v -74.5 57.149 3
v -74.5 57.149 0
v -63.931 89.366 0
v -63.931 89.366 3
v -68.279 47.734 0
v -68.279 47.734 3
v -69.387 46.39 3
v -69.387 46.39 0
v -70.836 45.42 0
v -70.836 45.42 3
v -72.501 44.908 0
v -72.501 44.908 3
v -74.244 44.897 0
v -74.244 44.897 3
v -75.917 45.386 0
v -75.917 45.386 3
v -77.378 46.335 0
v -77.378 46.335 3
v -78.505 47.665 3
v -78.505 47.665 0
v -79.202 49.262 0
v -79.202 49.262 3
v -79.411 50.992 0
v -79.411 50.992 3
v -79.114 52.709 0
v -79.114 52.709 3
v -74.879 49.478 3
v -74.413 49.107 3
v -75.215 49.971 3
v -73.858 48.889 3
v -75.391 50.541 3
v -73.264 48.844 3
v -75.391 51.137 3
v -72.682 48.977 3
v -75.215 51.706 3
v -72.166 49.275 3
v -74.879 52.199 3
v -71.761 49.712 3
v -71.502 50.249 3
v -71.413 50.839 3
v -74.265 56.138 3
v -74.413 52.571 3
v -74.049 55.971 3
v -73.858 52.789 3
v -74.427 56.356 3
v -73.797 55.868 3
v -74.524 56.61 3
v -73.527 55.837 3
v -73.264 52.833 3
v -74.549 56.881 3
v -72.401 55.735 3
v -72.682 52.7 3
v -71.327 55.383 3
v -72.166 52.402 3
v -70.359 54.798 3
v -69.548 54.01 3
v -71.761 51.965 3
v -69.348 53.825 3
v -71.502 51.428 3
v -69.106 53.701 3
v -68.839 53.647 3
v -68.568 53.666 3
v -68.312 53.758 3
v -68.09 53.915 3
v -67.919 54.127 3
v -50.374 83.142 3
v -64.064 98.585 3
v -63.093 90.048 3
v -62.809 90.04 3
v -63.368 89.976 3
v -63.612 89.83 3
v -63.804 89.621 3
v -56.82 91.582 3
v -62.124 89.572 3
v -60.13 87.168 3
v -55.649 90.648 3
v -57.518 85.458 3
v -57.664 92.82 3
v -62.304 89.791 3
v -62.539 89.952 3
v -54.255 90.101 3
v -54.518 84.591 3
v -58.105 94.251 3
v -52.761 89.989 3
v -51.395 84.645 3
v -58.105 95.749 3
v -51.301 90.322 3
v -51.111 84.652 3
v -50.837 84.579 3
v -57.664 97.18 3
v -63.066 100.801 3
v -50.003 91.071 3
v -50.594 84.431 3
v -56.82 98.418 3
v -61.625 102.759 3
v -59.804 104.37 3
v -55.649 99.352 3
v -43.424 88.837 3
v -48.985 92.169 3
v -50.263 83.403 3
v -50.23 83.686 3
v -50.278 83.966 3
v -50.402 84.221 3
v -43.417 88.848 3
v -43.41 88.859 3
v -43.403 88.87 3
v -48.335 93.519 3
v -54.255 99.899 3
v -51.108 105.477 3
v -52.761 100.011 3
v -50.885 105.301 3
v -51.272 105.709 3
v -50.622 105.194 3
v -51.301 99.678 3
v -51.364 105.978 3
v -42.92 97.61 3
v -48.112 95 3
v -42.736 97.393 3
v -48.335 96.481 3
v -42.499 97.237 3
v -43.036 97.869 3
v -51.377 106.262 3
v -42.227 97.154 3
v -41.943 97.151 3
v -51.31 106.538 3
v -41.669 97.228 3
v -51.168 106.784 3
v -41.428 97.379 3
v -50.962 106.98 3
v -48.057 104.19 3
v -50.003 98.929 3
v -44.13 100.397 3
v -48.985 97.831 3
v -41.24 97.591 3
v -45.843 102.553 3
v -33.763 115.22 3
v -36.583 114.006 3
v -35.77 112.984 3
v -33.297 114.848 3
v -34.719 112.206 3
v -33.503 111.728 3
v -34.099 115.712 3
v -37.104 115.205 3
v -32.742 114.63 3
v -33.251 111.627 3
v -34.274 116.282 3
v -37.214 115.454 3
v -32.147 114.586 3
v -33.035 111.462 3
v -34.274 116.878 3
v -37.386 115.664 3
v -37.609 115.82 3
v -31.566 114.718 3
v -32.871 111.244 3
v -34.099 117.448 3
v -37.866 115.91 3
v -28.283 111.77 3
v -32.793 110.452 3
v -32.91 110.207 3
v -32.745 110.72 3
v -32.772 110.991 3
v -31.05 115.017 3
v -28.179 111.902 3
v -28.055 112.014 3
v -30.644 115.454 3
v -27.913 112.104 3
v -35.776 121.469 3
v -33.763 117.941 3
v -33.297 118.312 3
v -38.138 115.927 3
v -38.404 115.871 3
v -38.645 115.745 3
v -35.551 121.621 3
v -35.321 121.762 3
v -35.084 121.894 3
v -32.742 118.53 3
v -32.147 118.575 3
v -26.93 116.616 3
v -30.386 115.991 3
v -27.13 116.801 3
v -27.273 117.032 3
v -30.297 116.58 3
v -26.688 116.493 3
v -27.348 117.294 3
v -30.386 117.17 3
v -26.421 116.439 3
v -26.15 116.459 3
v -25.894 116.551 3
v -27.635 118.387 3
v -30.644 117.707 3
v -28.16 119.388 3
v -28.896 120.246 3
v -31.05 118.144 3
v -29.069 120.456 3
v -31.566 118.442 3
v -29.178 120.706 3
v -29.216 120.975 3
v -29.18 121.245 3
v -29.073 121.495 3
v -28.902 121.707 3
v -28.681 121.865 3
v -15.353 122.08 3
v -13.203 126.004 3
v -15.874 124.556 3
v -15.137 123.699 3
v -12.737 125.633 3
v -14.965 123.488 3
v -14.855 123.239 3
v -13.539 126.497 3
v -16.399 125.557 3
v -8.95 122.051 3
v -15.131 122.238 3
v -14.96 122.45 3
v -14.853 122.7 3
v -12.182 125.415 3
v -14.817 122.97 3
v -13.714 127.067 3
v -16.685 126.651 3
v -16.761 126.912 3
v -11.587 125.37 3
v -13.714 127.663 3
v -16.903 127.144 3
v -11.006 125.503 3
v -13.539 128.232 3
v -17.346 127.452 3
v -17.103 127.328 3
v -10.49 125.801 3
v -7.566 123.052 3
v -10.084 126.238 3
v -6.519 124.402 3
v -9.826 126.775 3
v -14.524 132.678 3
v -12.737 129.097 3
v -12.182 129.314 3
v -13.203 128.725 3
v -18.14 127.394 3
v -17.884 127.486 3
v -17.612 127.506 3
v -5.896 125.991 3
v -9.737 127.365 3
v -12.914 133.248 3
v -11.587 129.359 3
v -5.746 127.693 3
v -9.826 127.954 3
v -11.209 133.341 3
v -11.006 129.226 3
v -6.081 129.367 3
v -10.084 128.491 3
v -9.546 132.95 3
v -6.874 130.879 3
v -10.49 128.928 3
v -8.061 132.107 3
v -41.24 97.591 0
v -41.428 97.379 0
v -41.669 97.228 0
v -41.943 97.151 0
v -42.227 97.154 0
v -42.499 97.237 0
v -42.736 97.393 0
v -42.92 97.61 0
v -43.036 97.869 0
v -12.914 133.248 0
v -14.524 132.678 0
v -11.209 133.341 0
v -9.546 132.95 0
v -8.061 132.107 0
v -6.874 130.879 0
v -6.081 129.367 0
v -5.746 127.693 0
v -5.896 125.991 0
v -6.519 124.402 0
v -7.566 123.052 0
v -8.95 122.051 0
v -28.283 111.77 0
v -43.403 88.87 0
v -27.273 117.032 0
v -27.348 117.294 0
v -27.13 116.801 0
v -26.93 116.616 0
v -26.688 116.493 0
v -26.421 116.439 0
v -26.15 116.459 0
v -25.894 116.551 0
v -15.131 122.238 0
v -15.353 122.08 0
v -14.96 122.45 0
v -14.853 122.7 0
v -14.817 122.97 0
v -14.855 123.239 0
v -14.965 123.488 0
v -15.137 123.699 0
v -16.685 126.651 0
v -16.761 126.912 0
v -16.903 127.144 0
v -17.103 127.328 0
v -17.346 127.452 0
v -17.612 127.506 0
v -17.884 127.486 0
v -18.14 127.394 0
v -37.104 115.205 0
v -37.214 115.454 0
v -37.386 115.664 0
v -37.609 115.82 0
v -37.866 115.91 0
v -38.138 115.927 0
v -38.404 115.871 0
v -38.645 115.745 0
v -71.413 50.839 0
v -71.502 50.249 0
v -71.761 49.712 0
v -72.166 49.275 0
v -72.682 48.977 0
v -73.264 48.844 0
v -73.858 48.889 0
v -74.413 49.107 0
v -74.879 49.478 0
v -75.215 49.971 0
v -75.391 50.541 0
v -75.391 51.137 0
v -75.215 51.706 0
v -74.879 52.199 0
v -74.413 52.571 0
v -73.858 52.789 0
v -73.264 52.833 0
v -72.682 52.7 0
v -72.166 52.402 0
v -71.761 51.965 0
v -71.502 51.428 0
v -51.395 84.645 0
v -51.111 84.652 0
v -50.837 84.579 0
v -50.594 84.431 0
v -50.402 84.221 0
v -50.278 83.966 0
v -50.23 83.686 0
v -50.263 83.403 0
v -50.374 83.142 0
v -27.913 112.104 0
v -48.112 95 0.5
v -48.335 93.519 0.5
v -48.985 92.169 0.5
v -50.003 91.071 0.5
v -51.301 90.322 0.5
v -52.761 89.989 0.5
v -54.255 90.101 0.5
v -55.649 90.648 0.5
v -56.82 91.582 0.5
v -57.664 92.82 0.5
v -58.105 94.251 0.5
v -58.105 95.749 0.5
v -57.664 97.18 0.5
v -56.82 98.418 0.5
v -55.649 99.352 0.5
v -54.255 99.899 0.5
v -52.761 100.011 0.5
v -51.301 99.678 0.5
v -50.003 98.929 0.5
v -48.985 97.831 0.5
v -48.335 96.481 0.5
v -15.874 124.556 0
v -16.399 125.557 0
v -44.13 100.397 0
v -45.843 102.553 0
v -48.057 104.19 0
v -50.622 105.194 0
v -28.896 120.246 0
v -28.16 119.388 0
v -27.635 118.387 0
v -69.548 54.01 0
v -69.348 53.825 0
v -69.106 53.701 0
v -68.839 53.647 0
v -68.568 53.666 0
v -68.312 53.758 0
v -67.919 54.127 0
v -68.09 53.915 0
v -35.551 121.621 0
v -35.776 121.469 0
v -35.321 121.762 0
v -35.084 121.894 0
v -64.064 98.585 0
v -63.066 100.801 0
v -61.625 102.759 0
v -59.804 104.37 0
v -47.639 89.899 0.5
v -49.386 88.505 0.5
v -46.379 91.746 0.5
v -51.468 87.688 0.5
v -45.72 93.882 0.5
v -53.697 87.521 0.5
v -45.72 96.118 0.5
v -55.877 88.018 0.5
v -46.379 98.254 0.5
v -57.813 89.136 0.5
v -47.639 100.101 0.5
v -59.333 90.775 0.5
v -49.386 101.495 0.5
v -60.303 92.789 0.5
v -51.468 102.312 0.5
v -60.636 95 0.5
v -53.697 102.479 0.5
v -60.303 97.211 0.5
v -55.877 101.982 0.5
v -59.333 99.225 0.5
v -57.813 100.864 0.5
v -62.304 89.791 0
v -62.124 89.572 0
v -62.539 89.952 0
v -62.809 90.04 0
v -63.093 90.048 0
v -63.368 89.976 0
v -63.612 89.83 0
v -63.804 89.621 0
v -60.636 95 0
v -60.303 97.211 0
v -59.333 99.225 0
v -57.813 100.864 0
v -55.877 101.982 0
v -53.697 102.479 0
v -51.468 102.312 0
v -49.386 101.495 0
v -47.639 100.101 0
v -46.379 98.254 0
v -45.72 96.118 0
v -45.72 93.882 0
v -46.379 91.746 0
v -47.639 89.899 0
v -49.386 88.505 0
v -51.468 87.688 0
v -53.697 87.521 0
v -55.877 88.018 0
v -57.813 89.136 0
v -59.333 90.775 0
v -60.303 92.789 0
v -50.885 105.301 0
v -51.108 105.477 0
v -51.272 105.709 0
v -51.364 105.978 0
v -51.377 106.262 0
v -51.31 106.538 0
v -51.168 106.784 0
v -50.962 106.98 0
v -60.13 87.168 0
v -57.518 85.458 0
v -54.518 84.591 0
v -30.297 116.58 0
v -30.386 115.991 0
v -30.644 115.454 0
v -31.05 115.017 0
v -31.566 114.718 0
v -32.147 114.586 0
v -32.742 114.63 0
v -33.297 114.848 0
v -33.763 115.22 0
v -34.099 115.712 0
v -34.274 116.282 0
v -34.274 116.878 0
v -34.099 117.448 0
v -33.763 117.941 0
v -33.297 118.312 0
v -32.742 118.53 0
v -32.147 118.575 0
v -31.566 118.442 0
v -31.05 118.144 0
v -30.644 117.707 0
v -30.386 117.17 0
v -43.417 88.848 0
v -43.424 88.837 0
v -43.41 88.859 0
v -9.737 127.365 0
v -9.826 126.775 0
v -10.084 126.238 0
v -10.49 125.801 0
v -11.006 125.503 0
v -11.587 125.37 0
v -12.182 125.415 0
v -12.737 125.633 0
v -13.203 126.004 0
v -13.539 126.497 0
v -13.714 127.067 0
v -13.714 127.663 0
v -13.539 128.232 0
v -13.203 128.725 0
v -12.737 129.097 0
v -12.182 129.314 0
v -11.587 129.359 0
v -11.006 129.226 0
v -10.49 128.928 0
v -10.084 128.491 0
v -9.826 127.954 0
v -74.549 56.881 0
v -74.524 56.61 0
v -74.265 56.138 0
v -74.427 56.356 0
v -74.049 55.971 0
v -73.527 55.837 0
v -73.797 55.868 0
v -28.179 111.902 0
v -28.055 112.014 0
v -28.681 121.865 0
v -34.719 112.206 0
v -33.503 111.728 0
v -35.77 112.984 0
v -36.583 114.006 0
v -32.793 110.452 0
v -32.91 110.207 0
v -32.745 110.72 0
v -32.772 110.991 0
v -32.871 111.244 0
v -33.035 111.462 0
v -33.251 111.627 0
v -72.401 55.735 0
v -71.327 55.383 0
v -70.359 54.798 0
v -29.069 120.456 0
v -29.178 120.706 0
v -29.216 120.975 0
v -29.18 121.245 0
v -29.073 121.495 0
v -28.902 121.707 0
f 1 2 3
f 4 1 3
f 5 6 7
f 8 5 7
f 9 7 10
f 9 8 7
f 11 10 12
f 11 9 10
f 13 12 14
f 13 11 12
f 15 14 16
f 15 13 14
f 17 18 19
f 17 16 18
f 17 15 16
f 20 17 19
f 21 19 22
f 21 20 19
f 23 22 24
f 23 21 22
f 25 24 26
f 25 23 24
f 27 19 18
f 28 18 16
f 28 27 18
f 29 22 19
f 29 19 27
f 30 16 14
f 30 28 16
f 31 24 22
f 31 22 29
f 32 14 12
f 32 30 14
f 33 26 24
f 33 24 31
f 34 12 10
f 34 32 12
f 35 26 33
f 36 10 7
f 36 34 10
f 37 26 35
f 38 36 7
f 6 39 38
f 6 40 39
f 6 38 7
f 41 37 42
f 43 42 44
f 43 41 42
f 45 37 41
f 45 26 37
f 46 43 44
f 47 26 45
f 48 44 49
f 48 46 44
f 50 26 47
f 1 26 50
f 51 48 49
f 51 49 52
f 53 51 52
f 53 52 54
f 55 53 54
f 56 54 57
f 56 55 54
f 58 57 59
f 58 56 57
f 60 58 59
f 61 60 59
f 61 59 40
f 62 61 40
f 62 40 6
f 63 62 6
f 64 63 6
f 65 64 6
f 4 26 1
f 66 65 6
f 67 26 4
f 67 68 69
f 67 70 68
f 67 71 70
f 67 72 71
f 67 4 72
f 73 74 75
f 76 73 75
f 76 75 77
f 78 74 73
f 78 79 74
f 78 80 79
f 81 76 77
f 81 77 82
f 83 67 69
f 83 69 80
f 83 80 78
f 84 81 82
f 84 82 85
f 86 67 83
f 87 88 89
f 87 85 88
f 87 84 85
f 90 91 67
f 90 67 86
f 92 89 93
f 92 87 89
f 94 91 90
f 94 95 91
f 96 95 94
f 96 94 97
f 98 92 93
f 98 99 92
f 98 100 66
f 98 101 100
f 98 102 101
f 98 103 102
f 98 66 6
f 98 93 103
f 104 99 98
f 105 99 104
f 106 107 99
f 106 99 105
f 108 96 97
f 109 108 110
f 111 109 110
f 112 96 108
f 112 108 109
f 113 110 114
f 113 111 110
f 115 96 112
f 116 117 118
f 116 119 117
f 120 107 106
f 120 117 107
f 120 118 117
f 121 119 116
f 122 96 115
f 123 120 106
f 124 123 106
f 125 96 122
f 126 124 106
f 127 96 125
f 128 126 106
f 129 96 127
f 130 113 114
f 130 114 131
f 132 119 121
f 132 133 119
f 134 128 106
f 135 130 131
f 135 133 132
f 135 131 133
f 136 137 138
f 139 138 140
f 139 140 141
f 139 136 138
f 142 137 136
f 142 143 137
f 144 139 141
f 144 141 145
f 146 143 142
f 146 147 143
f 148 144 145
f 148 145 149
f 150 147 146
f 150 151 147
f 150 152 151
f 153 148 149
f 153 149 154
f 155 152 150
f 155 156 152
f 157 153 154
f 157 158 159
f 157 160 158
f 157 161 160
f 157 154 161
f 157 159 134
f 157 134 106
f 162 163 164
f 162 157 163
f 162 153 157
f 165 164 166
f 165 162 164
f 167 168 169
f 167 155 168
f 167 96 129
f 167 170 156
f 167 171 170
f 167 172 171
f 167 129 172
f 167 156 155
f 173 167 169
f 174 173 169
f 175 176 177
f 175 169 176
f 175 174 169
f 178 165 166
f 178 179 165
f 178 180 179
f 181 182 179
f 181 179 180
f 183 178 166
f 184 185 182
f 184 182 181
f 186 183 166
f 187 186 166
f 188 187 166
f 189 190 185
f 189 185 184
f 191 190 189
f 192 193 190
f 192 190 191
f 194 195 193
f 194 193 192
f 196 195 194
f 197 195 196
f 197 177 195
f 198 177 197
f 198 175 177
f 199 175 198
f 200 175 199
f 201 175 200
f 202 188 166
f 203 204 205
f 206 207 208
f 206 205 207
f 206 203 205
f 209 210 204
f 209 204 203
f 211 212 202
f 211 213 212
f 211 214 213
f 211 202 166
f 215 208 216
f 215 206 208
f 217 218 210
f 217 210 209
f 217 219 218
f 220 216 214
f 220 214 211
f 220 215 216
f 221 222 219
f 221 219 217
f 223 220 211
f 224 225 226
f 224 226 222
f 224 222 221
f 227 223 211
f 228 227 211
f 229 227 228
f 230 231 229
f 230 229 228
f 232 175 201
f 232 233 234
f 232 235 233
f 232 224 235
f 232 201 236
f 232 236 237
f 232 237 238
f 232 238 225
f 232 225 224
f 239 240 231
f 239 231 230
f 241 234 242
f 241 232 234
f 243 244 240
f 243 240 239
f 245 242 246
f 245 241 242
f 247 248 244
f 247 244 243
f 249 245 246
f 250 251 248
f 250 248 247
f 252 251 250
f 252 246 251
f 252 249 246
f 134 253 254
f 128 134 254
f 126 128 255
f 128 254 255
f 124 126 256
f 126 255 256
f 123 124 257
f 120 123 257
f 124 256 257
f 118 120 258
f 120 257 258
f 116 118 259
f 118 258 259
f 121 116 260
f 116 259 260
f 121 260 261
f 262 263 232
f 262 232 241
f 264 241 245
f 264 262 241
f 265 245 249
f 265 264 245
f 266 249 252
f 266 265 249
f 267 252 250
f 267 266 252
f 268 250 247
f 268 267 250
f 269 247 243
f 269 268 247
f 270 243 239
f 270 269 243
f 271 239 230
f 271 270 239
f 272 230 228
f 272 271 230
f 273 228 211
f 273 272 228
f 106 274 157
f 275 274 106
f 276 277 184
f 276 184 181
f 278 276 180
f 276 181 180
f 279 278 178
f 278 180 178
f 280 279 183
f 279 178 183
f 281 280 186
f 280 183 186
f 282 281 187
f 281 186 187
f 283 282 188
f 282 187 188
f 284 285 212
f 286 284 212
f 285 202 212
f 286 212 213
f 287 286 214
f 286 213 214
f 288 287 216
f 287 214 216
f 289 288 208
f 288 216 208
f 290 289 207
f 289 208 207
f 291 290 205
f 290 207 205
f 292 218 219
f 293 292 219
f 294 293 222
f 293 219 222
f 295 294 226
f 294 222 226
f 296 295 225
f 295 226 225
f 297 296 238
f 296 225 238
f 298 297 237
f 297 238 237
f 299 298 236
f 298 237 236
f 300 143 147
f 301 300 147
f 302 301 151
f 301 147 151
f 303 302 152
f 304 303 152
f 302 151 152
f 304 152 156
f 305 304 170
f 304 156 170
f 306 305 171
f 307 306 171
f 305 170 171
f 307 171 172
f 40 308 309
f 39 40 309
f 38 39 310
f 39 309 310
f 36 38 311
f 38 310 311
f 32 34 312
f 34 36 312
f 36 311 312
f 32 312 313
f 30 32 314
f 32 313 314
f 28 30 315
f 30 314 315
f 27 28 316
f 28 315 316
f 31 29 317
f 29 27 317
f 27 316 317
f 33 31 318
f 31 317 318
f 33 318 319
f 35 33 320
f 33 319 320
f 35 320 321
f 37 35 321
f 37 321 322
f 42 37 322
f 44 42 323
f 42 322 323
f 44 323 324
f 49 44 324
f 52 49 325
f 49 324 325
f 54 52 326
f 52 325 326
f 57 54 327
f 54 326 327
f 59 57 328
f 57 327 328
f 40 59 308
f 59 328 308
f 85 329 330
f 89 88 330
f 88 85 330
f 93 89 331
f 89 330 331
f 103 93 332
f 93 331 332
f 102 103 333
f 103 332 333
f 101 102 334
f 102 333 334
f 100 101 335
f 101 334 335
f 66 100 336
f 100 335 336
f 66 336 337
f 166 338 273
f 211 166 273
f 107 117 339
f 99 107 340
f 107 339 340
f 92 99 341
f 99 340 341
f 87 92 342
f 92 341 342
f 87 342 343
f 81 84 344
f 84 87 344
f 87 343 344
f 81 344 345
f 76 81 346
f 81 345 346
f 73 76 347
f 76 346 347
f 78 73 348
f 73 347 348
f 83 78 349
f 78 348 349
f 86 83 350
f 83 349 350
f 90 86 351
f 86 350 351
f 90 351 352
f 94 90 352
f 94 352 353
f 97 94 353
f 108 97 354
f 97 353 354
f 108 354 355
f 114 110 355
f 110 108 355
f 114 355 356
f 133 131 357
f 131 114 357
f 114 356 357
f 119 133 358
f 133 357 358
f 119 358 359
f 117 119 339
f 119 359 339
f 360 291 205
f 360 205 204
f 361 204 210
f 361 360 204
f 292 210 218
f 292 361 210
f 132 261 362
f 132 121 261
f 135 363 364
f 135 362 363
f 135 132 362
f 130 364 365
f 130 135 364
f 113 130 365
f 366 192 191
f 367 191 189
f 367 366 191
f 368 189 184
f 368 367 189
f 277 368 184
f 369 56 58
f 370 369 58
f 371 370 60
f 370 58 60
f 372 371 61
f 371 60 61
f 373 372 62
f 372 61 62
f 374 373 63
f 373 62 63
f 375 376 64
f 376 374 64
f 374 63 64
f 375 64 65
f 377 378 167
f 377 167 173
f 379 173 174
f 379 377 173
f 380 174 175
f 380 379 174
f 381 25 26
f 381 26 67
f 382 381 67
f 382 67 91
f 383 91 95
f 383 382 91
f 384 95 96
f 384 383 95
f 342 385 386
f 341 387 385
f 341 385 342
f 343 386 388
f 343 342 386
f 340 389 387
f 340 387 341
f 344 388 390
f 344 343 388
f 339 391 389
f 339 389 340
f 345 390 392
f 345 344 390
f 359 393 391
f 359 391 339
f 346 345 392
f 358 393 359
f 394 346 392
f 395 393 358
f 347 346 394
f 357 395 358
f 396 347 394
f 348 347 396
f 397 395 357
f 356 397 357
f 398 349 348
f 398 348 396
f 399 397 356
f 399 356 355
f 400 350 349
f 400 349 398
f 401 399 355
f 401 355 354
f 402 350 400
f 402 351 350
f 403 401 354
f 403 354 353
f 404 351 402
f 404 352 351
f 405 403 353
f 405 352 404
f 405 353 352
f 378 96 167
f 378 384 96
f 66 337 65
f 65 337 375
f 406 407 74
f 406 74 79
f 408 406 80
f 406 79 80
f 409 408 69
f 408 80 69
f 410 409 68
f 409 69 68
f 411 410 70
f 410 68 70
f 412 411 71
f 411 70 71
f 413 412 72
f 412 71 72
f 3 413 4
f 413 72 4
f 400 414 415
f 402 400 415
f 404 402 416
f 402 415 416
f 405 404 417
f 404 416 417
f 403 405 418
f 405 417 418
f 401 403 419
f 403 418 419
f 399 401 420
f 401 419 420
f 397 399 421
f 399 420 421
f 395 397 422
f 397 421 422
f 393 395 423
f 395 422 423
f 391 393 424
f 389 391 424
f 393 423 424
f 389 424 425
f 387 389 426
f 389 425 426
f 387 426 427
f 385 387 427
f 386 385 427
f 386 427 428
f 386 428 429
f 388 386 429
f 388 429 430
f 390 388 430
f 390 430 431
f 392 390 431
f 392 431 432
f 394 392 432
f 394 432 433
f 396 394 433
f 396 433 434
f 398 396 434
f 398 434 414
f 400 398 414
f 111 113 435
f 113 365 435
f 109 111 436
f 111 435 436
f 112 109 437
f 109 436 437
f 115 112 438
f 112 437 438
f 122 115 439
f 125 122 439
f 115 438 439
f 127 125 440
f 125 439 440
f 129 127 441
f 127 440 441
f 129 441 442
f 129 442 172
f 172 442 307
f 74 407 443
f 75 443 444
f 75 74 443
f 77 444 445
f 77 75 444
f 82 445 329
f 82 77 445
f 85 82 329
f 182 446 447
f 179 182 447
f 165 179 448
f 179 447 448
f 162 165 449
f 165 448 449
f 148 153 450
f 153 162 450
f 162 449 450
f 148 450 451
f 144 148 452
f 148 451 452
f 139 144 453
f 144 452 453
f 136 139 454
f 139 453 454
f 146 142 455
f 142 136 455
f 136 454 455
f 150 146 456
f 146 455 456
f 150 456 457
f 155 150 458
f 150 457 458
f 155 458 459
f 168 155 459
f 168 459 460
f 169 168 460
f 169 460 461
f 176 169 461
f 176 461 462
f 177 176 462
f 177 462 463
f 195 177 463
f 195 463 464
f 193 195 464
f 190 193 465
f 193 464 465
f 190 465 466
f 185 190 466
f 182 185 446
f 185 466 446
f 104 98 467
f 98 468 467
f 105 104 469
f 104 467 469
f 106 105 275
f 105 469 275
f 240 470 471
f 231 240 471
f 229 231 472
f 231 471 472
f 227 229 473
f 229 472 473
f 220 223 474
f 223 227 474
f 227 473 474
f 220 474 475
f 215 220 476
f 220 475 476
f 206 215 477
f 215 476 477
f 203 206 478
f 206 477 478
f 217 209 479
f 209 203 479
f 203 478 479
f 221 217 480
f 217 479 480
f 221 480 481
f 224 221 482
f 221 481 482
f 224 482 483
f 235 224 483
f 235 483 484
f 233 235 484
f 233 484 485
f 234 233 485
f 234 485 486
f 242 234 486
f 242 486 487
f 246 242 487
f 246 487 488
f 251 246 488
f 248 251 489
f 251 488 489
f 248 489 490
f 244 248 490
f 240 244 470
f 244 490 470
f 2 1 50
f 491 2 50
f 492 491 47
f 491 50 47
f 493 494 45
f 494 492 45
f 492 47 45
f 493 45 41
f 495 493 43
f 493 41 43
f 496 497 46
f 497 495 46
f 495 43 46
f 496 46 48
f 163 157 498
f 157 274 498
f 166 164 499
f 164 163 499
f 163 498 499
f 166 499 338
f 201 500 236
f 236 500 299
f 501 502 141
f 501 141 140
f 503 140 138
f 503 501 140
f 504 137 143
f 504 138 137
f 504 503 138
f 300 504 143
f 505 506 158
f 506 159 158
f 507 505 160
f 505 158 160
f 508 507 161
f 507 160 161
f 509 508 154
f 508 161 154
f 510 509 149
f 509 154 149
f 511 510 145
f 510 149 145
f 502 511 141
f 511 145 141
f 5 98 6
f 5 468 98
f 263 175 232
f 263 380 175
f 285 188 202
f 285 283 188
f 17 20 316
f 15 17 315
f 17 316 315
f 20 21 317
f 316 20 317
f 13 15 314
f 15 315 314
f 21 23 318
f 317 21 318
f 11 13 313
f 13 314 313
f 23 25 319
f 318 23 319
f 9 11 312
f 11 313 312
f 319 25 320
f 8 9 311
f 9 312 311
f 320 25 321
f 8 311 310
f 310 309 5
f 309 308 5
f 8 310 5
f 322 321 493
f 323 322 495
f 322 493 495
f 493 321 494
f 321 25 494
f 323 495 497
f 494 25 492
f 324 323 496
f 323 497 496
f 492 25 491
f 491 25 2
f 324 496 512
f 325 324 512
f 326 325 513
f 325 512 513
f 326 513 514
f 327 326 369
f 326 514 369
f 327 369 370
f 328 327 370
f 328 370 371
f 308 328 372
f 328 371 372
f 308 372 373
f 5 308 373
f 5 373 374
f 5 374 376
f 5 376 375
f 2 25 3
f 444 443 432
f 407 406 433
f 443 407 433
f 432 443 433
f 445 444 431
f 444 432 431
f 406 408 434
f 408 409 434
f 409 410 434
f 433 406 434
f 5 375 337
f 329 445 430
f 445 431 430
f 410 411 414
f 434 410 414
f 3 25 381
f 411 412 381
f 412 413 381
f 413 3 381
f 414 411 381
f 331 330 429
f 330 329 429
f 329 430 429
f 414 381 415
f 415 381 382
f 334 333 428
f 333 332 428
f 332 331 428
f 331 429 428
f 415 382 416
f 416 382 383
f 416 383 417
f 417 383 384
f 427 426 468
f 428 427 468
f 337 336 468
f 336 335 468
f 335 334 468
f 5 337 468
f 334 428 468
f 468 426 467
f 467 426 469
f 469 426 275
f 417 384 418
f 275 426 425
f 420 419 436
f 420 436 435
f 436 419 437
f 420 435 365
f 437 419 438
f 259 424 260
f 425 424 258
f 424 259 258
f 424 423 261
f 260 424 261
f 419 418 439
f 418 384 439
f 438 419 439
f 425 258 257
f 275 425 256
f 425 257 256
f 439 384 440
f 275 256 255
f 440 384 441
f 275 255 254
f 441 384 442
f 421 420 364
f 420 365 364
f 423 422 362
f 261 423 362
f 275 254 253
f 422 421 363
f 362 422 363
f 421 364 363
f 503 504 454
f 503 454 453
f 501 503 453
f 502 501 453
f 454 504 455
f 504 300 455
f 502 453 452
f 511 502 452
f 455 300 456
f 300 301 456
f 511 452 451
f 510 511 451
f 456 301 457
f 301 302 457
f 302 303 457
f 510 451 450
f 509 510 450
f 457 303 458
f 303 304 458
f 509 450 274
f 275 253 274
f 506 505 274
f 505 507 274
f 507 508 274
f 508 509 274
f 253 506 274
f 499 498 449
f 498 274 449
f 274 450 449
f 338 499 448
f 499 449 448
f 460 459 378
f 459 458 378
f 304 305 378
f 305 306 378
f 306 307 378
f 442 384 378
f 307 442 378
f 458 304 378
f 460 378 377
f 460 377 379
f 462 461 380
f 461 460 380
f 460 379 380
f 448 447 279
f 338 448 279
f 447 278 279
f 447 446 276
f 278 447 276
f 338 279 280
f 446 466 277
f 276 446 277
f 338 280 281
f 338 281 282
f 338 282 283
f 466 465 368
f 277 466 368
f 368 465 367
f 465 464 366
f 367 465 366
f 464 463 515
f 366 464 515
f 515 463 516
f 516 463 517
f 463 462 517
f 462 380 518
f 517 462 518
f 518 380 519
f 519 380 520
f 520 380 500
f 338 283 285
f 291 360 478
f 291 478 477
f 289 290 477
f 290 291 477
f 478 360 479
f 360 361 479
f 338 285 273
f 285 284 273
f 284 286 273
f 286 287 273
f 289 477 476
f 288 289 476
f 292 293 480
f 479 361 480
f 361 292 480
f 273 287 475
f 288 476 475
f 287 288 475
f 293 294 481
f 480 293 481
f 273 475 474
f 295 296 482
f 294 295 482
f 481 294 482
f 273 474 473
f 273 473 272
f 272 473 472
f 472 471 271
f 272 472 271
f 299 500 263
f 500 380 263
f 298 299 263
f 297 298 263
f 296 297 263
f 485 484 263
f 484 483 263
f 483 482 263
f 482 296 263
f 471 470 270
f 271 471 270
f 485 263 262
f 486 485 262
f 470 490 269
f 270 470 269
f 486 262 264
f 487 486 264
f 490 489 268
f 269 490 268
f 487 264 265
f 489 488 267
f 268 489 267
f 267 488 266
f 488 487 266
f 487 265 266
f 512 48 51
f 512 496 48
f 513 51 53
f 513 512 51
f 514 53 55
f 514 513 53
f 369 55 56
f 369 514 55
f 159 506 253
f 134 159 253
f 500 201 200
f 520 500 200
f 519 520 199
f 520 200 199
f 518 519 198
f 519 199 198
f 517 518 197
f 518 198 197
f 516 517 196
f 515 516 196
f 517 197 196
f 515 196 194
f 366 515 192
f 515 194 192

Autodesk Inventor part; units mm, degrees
ref_plane "YZ Plane" through (0, 0, 0) normal (1, 0, 0) x (0, 1, 0)
ref_plane "XZ Plane" through (0, 0, 0) normal (0, 1, 0) x (-1, 0, 0)
ref_plane "XY Plane" through (0, 0, 0) normal (0, 0, 1) x (1, 0, 0)
sketch "スケッチ1" plane through (0, 0, 0) normal (0, 0, 1) x (1, 0, 0)
  circle A0 centre (-73.413, 50.8387) radius 2
  circle A1 centre (-11.7367, 127.3646) radius 2
  circle A2 centre (-32.2967, 116.5802) radius 2
  circle A3 centre (-53.1365, 95) radius 5.025
  circle A4 centre (-11.7367, 127.3646) radius 6
  circle A5 centre (-32.2967, 116.5802) radius 6
  circle A6 centre (-53.1365, 95) radius 11.5
  circle A7 centre (-73.413, 50.8387) radius 6
  line L0 (-79.114, 52.7091) -> (-64.0635, 98.5848)
  line L1 (-59.8041, 104.3698) -> (-35.7755, 121.4688)
  line L2 (-35.0838, 121.8936) -> (-14.5238, 132.678)
  line L3 (-29.5097, 111.2668) -> (-8.9496, 122.0512)
  line L4 (-27.2897, 113.2742) -> (-43.5397, 88.6634)
  line L5 (-43.2957, 89.0494) -> (-68.2786, 47.734)
  circle A8 centre (-53.1365, 95) radius 7.5
  point P0 (0, 0)
  point P1 (-43.4139, 88.854)
  point P2 (-28.1412, 111.9846)
  dimension "d0" = 4
  dimension "d1" = 4
  dimension "d2" = 4
  dimension "d3" = 10.05
  dimension "d4" = 4
  dimension "d5" = 4
  dimension "d7" = 4
  dimension "d15" = 15
  dimension "d16" = 4
extrude "押し出し1" add sketch "スケッチ1" along normal blind 3 contours A4 | A4 L3 L4 A5 L2 | A5 | L4 L5 A6 L1 A5 L3 | L3 A5 L4 | L5 A7 L0 A6 L4 | L4 A6 L5 | A6 | A7 | A8
sketch "スケッチ2" plane through (0, 0, 0) normal (0, 0, -1) x (-1, 0, 0)
  circle A0 centre (53.1365, 95) radius 5.025 projected
  circle A1 centre (53.1365, 95) radius 7.5
  point P0 (0, 0)
  dimension "d12" = 15
extrude "押し出し2" cut sketch "スケッチ2" against normal blind 0.5
shell "シェル2" thickness 3 removed faces 2 at (-67.6516, 80.9362, 0) at (-66.6917, 80.9872, 3)
fillet "フィレット2" radius 1 19 edges at (-43.4139, 88.854, 1.5) (-28.1412, 111.9846, 1.5) (-75.0166, 55.5746, 1.5) (-63.1345, 91.7924, 1.75) (-63.1345, 91.7924, 0.25) (-68.776, 52.7092, 1.5) (-49.0526, 85.3267, 0.25) (-49.0526, 85.3267, 1.75) (-45.6365, 95, 0.5) (-53.0422, 105.4996, 0.25) (-53.0422, 105.4996, 1.75) (-37.2952, 116.7053, 1.5) (-42.6466, 95.4607, 0.25) (-31.9972, 111.5892, 1.5) (-42.6466, 95.4607, 1.75) (-30.148, 121.0949, 1.5) (-16.6725, 128.1633, 1.5) (-27.3609, 115.7815, 1.5) (-13.8854, 122.8499, 1.5)
sketch "スケッチ3" plane through (0, 0, 0) normal (0, 0, -1) x (-1, 0, 0)
  circle A0 centre (53.1365, 95) radius 5.025 projected
  circle A1 centre (53.1365, 95) radius 7.5
  point P0 (0, 0)
  dimension "d19" = 15
extrude "押し出し3" cut sketch "スケッチ3" against normal blind 0.5 contours A0 | A1
properties part number "アーム軸抑え3" material "アルミニウム 2014-T4"
